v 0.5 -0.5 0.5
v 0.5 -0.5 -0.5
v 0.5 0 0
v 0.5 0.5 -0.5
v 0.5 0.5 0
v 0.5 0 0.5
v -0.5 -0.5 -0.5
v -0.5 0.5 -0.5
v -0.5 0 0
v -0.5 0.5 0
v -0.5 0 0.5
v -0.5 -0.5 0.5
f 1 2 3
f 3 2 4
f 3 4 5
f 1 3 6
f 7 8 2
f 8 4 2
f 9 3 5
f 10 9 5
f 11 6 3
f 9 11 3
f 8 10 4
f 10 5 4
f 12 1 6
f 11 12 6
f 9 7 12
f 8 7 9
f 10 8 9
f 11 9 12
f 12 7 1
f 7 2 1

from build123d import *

# Parameters (mm, degrees)
AUFSATZ_LINEAR_AUSTRAGEN1_DEPTH = 0.5


with BuildPart() as part:
    # Skizze1 → Aufsatz-Linear austragen1 (new body, symmetric)
    with BuildSketch(Plane(origin=(0, 0, 0), x_dir=(0, 0, -1), z_dir=(1, 0, 0))):
        Polygon((0, 0), (0, 0.5), (0.5, 0.5), (0.5, -0.5), (-0.5, -0.5), (-0.5, 0), align=None)
    extrude(amount=AUFSATZ_LINEAR_AUSTRAGEN1_DEPTH, both=True)


solid = part.part
